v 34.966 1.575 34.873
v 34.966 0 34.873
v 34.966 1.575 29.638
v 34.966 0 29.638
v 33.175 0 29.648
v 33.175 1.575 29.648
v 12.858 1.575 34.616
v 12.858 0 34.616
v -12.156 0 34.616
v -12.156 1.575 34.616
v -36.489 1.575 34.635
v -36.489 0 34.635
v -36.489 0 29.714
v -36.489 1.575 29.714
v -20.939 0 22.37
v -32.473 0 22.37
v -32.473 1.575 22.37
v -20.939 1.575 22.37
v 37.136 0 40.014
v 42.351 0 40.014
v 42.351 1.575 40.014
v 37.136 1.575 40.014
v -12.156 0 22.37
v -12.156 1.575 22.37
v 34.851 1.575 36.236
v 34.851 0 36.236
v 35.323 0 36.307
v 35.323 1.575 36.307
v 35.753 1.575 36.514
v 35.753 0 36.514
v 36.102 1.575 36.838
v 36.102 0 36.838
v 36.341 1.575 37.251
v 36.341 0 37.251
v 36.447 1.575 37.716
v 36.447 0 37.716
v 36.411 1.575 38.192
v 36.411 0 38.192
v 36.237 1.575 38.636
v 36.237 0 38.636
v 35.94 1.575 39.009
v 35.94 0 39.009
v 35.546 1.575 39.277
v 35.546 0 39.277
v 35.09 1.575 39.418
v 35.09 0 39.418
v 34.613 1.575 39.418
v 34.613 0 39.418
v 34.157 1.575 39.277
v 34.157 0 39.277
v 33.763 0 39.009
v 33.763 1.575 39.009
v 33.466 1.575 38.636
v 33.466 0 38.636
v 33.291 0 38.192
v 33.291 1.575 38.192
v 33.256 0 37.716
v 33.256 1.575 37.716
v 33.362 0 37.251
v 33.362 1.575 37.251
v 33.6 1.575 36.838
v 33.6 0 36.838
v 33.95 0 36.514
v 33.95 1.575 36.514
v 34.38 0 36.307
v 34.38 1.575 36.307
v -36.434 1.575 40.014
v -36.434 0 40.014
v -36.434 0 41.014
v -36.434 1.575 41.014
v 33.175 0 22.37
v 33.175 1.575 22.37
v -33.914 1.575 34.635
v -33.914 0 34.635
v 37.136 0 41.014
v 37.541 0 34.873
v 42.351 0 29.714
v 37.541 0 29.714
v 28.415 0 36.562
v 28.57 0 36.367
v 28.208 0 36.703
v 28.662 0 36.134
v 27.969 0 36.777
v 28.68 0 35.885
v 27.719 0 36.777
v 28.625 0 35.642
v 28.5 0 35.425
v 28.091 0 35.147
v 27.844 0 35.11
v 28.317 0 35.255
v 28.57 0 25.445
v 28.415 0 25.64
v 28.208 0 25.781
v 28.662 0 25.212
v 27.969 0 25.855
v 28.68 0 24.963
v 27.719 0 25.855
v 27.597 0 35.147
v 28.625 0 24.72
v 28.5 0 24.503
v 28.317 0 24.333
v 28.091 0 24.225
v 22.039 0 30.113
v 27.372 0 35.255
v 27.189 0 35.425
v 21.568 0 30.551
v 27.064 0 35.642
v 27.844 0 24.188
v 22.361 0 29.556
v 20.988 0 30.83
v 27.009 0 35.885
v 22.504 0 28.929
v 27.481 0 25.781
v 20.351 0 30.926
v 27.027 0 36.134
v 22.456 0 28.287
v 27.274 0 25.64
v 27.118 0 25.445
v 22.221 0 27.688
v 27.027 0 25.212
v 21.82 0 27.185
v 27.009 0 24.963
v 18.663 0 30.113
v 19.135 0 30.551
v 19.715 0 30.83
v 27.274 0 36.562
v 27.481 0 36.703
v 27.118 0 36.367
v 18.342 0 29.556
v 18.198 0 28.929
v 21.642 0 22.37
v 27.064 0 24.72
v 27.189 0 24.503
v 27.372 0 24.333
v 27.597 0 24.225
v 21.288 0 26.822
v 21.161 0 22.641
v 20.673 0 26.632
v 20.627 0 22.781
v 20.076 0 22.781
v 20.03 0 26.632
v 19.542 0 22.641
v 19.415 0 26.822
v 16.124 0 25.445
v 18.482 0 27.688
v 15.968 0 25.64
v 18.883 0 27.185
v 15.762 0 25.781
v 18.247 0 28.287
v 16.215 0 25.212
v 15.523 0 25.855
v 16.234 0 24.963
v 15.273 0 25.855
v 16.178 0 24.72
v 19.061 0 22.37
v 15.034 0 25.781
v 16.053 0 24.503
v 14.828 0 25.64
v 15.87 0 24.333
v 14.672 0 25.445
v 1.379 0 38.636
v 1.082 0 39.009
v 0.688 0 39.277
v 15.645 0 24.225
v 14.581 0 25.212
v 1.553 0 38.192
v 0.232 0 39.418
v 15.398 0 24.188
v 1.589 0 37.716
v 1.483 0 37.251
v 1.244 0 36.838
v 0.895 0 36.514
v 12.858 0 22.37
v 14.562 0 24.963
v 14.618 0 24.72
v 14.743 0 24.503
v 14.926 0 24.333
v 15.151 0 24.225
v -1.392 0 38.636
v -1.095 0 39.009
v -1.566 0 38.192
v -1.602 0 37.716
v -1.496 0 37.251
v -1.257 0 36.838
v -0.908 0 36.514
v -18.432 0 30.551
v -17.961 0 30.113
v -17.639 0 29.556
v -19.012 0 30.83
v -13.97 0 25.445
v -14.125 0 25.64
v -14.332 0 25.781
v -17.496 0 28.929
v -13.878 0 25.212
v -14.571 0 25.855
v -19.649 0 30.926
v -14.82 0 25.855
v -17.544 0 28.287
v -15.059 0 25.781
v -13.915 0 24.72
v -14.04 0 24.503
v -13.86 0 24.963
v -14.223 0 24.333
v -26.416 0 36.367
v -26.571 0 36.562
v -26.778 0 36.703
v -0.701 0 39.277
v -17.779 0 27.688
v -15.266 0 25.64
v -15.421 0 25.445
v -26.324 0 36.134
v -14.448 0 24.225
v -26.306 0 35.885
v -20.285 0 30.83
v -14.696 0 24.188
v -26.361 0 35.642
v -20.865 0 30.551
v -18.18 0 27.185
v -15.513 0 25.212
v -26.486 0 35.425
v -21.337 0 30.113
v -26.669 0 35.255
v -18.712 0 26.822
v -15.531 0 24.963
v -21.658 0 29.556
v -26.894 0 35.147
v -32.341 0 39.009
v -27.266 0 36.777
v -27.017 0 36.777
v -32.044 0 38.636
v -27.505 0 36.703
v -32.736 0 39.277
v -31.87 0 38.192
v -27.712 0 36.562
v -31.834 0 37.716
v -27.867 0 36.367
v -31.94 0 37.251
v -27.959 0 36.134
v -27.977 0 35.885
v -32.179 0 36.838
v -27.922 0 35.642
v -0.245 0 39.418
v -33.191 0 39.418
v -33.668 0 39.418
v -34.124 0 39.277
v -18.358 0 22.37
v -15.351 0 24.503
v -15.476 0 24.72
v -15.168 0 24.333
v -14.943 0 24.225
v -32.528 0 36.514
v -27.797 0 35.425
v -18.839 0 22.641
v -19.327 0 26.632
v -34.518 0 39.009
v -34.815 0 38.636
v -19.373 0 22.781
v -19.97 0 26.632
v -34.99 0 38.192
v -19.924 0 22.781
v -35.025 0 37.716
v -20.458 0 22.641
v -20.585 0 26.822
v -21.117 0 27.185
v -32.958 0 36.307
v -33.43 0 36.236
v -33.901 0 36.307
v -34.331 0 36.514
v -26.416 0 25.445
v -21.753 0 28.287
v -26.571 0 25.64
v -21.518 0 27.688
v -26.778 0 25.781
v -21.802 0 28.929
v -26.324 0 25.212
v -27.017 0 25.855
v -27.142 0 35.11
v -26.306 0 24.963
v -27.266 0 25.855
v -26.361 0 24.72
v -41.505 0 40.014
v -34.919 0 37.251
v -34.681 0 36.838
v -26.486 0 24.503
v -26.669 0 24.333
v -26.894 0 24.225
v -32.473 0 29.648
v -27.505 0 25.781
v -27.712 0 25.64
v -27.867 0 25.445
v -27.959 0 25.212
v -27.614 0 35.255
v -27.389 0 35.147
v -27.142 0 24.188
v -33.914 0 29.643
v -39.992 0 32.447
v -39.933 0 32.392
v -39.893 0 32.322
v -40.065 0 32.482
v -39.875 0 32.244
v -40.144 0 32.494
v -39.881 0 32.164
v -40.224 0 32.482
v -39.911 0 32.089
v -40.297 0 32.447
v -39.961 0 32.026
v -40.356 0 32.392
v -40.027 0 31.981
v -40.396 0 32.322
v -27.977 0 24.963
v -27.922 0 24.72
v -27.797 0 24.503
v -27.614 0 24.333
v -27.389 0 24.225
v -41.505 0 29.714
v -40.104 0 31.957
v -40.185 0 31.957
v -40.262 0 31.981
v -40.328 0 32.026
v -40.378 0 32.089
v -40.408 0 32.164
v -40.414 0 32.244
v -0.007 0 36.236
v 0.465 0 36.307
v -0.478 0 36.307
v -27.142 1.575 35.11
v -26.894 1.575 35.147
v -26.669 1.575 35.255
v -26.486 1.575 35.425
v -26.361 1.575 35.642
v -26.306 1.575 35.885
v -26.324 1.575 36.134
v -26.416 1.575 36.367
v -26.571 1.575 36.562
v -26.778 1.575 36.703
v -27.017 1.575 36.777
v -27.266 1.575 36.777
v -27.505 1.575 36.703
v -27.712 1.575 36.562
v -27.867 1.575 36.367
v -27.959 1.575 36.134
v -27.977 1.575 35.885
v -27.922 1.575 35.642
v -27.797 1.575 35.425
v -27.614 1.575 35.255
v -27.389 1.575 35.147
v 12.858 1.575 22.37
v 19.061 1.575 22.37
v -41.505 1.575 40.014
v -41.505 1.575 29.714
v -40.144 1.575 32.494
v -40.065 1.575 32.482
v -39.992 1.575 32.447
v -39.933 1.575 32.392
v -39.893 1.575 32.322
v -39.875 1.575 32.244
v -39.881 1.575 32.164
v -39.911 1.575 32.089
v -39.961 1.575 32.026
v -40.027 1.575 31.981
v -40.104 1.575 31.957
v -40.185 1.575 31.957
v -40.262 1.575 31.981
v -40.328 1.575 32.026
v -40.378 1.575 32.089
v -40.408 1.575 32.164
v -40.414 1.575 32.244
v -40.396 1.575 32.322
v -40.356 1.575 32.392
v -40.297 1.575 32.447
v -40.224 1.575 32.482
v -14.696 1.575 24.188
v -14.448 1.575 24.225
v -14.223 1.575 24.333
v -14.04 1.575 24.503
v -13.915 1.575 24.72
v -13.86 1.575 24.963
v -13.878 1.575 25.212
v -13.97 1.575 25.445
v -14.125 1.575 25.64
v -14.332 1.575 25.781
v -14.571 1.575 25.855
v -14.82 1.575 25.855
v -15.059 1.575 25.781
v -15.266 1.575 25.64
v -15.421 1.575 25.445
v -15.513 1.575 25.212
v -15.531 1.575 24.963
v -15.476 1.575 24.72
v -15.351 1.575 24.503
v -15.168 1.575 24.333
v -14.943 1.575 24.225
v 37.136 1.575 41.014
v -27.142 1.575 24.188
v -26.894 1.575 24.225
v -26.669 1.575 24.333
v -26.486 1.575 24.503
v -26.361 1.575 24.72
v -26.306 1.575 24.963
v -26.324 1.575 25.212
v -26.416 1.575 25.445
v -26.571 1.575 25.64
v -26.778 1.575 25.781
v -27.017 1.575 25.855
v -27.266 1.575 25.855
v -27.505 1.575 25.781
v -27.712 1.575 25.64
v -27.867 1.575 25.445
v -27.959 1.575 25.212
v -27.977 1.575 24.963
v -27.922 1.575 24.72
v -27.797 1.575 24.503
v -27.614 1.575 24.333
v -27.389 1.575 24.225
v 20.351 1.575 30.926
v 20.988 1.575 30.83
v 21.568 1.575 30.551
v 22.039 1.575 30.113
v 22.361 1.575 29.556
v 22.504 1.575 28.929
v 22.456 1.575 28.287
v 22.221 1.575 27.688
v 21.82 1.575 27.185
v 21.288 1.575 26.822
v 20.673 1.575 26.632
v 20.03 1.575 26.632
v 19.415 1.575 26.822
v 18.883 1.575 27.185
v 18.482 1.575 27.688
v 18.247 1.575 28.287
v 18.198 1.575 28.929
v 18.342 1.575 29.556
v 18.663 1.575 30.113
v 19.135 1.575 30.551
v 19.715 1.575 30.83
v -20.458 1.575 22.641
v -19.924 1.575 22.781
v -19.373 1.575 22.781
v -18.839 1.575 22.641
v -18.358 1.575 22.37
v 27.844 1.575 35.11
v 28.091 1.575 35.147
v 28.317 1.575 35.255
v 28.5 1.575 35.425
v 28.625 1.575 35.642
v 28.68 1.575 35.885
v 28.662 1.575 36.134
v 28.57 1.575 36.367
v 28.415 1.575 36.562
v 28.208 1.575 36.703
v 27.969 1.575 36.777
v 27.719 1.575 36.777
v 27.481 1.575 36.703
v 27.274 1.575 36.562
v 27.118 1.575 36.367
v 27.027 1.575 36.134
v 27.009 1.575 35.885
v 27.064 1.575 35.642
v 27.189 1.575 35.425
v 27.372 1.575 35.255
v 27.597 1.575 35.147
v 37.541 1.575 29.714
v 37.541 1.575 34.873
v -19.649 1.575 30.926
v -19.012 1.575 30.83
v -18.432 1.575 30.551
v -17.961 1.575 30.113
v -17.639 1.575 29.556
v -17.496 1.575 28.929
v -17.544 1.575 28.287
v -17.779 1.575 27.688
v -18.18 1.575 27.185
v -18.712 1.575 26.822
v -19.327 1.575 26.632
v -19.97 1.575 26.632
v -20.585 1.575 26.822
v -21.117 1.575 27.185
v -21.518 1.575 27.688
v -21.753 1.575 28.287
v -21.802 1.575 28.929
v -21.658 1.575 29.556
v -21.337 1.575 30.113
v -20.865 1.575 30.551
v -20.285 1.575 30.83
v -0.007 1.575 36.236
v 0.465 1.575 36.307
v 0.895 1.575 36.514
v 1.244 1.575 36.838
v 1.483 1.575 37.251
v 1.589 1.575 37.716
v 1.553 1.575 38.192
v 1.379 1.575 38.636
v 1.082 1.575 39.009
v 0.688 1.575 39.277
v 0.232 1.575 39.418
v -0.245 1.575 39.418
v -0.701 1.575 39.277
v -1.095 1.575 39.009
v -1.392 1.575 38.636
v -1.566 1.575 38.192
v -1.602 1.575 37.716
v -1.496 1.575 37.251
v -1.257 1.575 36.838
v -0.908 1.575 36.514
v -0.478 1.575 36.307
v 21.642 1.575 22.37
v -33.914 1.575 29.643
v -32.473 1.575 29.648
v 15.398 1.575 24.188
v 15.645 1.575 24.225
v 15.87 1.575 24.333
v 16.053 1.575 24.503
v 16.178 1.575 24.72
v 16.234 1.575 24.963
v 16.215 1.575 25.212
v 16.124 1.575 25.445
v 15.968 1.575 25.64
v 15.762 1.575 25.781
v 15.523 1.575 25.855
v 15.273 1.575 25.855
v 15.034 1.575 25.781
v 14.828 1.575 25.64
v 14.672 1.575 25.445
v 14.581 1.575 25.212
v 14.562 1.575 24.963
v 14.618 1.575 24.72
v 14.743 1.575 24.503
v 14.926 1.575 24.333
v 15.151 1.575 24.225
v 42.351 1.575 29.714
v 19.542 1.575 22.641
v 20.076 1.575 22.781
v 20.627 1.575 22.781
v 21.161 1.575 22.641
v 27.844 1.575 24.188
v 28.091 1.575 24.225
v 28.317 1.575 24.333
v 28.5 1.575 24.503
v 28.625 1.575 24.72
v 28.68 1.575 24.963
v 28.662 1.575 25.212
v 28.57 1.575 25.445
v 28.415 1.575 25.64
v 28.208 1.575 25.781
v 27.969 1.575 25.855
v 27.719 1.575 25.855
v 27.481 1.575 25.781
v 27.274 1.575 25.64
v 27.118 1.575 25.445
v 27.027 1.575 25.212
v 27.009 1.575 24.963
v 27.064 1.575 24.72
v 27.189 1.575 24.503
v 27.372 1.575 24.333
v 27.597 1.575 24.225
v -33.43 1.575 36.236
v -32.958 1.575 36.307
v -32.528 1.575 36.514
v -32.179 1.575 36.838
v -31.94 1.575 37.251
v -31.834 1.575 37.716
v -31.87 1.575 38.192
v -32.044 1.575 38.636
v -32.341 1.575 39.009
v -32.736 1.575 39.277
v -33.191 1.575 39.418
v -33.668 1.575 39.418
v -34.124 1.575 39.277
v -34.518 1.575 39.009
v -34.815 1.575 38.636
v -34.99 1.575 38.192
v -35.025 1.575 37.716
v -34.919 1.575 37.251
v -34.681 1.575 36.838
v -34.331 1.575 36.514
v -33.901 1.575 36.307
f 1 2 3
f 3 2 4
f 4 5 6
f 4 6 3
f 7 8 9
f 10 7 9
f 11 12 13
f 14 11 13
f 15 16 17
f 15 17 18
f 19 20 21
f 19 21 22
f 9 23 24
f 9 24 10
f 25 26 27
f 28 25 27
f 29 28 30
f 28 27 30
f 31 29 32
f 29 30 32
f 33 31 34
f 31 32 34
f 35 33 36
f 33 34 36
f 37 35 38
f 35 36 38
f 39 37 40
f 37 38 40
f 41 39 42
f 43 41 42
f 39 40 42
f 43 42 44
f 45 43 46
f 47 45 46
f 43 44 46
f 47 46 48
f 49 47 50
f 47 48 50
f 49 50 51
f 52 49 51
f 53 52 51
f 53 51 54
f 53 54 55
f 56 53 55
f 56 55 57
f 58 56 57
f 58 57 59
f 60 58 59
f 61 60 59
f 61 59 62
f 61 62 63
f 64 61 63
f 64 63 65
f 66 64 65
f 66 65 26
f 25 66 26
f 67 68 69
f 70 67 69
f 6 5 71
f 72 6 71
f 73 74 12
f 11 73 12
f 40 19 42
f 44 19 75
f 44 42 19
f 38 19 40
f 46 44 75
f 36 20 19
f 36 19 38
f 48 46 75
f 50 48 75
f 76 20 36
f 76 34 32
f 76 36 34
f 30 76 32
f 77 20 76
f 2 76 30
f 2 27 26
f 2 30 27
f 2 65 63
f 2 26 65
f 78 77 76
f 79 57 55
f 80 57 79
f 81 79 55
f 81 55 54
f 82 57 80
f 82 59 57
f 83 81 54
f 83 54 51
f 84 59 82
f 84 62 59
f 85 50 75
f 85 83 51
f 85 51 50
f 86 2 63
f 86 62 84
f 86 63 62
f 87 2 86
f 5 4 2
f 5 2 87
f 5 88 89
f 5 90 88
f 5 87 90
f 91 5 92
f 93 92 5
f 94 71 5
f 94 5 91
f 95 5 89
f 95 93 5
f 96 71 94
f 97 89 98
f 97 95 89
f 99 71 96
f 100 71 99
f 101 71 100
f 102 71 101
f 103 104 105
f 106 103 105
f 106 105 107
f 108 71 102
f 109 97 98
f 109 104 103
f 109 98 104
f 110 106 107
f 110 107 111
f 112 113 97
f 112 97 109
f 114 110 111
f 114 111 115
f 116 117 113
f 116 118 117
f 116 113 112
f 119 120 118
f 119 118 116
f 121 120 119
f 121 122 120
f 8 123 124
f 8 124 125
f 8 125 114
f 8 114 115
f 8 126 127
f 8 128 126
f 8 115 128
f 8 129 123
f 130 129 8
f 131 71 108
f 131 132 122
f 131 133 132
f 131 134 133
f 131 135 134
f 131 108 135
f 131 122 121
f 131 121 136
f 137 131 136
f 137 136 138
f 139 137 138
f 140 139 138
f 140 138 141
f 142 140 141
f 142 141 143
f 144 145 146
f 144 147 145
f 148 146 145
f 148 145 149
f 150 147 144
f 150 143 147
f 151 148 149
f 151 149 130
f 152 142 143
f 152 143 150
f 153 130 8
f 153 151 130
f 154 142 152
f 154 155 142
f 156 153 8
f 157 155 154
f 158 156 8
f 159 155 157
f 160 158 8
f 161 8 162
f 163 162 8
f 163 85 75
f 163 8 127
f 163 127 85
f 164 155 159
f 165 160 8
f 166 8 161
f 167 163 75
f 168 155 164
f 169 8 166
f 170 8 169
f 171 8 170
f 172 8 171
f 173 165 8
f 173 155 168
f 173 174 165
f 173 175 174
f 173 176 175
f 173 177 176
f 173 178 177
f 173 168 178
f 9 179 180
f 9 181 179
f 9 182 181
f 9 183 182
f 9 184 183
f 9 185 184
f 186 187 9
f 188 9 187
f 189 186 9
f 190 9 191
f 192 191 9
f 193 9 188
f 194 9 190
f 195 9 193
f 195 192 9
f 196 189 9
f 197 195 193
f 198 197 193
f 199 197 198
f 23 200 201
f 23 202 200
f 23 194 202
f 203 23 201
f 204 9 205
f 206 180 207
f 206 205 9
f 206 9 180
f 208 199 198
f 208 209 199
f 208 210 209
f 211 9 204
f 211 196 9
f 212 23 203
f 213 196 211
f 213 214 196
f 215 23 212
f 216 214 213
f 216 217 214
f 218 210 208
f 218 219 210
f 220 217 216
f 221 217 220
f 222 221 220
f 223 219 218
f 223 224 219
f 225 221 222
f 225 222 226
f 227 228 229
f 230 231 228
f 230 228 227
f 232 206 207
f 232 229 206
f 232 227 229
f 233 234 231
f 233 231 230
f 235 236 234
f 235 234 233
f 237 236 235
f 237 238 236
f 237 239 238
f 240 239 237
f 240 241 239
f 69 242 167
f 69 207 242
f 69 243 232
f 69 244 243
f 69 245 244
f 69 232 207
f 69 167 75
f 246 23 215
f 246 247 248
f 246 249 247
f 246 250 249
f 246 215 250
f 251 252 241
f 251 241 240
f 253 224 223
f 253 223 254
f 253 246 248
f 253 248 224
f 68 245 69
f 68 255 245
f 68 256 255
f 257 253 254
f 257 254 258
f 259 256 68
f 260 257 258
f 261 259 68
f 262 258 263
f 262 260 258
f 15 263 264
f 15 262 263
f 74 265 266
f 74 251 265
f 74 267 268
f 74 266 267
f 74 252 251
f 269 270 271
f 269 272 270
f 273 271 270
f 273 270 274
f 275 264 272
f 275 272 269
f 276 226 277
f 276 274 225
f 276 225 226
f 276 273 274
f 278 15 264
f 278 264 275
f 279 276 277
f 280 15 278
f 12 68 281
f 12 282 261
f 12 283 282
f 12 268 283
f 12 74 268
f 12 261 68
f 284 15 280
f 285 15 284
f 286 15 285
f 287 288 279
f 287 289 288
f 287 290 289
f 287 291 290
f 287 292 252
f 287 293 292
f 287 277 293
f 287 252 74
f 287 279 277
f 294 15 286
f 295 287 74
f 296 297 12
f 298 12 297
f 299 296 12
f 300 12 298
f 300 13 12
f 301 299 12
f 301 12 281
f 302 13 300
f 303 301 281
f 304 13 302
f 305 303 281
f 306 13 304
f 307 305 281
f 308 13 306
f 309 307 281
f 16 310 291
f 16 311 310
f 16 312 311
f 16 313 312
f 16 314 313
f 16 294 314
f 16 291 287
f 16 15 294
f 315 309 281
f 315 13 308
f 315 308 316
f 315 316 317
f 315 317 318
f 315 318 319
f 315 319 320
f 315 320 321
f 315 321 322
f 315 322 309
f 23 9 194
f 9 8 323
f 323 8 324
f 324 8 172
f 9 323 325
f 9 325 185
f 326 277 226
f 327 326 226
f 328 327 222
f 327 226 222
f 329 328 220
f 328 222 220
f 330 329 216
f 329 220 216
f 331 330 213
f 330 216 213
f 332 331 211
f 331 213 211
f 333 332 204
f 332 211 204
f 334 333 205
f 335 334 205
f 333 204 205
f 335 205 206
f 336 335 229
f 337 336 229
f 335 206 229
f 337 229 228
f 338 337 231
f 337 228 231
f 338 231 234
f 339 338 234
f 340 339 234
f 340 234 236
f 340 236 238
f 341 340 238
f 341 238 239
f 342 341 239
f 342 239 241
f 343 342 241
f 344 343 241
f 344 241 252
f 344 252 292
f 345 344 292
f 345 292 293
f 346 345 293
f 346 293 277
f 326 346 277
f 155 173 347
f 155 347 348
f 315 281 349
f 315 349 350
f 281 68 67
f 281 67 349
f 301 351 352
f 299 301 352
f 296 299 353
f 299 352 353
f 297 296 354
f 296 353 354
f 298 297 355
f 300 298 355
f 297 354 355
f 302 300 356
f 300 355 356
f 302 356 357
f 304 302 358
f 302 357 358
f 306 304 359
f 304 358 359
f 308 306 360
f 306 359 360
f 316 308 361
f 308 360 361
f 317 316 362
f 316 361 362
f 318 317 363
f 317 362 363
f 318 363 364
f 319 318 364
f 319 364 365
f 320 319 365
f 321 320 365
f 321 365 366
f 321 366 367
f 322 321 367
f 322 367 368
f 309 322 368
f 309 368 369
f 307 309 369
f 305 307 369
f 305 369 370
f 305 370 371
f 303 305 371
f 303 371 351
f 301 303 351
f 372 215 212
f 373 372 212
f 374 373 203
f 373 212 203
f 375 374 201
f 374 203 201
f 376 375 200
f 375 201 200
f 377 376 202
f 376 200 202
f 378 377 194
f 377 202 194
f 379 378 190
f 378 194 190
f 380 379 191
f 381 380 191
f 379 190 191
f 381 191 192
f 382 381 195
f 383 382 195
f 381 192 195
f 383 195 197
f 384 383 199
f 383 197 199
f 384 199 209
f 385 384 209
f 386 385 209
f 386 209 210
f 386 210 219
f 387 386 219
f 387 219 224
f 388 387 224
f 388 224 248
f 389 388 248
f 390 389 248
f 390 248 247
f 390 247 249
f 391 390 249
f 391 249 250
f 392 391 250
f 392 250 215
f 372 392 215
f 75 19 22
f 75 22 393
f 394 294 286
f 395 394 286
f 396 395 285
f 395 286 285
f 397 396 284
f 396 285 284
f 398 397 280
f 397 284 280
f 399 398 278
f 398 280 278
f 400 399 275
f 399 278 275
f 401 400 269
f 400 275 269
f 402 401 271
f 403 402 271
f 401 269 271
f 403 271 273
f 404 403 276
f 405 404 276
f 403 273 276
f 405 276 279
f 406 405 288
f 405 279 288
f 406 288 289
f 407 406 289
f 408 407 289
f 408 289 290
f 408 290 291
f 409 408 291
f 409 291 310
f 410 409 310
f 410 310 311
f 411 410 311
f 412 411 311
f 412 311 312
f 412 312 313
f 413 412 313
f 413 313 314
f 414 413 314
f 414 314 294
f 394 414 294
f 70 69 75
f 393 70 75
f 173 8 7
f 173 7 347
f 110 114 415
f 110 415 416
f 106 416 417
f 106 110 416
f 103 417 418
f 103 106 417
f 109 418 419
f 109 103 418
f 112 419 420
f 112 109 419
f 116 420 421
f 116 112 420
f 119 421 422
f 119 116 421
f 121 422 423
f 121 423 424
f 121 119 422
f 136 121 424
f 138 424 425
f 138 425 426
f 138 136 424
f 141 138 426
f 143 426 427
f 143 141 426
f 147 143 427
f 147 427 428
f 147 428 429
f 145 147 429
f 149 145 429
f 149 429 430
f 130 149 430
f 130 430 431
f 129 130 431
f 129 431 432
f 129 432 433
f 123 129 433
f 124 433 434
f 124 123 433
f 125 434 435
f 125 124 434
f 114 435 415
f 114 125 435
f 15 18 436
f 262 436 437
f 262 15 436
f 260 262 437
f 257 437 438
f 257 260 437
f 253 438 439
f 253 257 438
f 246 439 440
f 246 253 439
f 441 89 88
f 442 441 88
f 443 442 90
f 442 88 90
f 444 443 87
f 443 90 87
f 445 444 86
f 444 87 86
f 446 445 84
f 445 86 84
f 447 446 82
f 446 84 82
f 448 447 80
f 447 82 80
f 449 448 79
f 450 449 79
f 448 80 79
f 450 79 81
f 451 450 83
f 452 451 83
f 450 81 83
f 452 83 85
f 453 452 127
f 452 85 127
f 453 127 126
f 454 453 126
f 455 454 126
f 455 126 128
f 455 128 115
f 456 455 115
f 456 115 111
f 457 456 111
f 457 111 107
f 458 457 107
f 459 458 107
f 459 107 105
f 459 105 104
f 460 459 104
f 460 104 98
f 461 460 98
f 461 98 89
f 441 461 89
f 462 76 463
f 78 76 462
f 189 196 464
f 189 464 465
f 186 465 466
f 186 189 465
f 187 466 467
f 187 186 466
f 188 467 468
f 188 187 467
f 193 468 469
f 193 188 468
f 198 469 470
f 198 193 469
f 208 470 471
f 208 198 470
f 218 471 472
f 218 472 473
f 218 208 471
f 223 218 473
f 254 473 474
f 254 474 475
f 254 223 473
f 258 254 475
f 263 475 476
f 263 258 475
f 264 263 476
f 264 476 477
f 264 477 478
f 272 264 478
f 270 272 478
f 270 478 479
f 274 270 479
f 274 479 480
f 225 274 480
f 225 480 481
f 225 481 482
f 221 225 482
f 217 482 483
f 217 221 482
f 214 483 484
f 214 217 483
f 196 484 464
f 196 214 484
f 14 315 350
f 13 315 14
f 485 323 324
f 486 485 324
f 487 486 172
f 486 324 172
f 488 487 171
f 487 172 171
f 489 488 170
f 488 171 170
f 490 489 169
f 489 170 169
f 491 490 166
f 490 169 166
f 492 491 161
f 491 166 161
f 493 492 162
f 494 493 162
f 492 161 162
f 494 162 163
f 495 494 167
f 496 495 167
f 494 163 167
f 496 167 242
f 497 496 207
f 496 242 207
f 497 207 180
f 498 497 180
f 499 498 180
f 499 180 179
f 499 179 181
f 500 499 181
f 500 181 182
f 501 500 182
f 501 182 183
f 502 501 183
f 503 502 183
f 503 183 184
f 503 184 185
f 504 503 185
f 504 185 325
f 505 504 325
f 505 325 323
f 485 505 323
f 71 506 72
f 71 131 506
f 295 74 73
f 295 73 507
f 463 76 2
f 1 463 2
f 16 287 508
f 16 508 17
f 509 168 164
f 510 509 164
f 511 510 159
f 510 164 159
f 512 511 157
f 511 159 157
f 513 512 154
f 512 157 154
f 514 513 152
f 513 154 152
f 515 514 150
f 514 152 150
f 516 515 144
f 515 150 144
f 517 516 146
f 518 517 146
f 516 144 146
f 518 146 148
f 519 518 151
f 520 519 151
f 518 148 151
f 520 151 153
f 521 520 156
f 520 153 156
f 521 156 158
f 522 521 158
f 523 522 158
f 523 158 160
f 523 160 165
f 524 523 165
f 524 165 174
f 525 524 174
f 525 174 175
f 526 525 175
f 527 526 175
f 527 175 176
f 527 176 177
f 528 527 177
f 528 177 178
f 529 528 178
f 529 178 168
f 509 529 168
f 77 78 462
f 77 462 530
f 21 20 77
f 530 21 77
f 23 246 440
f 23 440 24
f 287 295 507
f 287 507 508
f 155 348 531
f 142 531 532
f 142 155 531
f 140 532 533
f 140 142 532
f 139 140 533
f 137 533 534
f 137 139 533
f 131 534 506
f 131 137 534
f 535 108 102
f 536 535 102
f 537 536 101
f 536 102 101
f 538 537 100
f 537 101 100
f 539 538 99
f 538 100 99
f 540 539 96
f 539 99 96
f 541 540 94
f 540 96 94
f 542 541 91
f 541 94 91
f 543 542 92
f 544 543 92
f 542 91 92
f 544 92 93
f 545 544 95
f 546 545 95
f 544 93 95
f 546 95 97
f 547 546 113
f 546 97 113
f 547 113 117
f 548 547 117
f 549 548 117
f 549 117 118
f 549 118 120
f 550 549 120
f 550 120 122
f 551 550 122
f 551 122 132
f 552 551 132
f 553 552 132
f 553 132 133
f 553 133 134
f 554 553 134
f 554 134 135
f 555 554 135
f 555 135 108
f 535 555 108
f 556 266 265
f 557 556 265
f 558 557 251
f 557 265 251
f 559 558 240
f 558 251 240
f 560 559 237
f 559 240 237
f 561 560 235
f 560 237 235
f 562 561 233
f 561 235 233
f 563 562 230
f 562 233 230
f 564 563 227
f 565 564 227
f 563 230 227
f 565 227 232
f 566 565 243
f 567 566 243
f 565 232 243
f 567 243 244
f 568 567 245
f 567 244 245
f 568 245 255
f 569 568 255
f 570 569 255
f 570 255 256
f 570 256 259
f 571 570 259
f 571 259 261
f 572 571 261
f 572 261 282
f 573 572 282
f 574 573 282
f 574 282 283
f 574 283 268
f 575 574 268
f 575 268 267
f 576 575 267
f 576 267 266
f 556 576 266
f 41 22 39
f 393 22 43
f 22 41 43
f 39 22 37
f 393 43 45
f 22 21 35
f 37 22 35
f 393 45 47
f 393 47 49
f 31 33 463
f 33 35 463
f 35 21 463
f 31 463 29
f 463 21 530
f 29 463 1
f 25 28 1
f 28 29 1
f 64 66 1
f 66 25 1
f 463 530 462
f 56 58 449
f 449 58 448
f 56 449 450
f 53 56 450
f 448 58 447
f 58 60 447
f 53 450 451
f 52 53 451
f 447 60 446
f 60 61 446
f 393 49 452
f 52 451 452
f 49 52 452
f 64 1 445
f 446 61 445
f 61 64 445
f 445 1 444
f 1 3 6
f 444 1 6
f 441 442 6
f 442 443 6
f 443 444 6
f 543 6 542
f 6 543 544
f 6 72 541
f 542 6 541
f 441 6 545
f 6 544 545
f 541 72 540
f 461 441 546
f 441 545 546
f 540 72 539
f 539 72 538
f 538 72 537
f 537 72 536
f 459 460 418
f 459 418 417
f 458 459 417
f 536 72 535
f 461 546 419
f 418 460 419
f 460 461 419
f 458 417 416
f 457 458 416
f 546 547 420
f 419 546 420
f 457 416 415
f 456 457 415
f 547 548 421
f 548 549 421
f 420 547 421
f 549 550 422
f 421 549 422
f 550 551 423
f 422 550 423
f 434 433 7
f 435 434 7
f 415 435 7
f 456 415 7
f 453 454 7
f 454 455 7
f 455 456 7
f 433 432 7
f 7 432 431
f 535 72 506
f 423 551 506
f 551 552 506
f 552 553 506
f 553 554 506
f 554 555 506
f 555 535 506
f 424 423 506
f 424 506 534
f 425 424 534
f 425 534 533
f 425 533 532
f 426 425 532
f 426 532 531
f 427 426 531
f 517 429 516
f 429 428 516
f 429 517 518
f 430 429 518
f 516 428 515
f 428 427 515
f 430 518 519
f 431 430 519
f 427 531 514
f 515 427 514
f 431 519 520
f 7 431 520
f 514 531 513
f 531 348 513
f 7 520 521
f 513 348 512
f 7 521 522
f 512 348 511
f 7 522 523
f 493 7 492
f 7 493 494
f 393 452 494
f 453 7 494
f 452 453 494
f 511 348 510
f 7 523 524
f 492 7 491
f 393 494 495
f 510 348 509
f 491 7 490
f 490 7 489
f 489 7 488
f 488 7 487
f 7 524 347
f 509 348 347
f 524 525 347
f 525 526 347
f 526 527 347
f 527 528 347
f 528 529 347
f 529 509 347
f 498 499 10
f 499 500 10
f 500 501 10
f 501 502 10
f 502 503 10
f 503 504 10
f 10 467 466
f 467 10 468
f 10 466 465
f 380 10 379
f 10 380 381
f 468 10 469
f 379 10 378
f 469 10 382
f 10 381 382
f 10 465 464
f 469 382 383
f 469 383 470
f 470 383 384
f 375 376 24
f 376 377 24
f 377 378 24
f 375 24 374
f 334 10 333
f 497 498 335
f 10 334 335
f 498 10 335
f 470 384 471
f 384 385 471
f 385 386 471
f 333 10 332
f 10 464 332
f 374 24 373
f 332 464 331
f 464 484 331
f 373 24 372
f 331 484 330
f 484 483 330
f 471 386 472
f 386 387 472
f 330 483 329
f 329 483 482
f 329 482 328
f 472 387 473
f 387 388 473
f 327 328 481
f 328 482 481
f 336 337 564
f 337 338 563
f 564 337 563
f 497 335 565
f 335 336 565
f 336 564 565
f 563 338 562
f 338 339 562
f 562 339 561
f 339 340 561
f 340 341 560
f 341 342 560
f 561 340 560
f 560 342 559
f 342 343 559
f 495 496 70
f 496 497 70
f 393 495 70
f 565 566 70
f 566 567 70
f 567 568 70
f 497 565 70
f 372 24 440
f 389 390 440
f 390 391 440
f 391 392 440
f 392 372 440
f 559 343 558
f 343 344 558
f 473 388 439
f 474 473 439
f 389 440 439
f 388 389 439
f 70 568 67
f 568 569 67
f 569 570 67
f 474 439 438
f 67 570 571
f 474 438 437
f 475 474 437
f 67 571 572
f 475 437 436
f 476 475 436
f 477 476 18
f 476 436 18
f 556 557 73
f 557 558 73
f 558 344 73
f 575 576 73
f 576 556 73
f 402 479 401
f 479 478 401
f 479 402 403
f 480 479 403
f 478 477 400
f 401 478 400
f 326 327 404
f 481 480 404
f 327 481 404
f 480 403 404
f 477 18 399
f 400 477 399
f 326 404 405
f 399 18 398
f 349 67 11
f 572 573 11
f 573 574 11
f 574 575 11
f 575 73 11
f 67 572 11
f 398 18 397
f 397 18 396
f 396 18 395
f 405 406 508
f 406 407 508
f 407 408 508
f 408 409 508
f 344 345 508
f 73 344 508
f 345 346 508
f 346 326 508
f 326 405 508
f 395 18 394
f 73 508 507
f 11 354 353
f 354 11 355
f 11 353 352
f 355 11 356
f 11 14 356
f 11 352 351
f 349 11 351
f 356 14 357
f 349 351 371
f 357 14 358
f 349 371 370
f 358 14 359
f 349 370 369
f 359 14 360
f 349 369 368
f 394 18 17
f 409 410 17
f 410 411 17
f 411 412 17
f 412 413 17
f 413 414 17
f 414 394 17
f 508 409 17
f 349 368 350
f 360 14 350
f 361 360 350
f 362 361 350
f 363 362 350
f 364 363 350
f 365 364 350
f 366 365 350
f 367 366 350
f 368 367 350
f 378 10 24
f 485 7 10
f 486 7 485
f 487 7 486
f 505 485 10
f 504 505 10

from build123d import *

# Parameters (mm, degrees)
SKETCH1_R                           = 2.159
BOSS_EXTRUDE1_DEPTH                 = 1.575
SKETCH2_W                           = 93.457658642
SKETCH2_H                           = 6.602
CUT_EXTRUDE1_DEPTH                  = 65.362755899
CUT_EXTRUDE2_DEPTH                  = 60.755092082
CUT_EXTRUDE3_DEPTH                  = 60.755092082
SKETCH6_R                           = 0.8382
CUT_EXTRUDE4_DEPTH                  = 2.54
SKETCH7_W                           = 65.648
SKETCH7_H                           = 12
CUT_EXTRUDE5_DEPTH                  = 59.286069146
SKETCH11_R                          = 0.270027719
ID_HOLE_DEPTH                       = 59.286069146
SKETCH12_W                          = 2.575
SKETCH12_H                          = 5
NOTCH_FOR_BPR_TOP_VIEW_DEPTH        = 59.286069146
SKETCH14_W                          = 2.575
SKETCH14_H                          = 12.502619879
NOTCH_FOR_BPL_TOP_VIEW_DEPTH        = 59.286069146
SKETCH17_W                          = 73.57
SKETCH17_H                          = 1
CREATE_LIP_FOR_M3_SPACER_HOLE_DEPTH = 1.575
SKETCH15_R                          = 1.6
HOLE_FOR_M3_SPACER_DEPTH            = 59.977069112
SKETCH19_W                          = 6.013982762
SKETCH19_H                          = 1.7
SKETCH19_W_2                        = 9.814467677
CUT_EXTRUDE7_DEPTH                  = 59.977069112


with BuildPart() as part:
    # Sketch1 → Boss-Extrude1 (new body)
    with BuildSketch(Plane(origin=(0, 0, 0), x_dir=(1, 0, 0), z_dir=(0, 1, 0))):
        Polygon((44.351293299, -40.014412246), (37.136293299, -40.014412246), (37.136293299, -46.615946892), (29.968293307, -46.615946892), (-30.083706693, -46.615946892), (-36.433706701, -46.615946892), (-36.433706701, -40.014412246), (-43.648706701, -40.014412246), (-43.648706701, -30.885946892), (-43.648706701, -29.647946892), (-42.378706693, -29.615946892), (-32.472706701, -29.647946892), (-32.472706701, -10.370428445), (-12.155556701, -10.370428445), (-12.155556701, -34.615947016), (-11.557706701, -34.615947016), (12.260293299, -34.615947016), (12.858143299, -34.615947016), (12.858143299, -10.370428445), (33.175293299, -10.370428445), (33.175293299, -12.929386892), (33.175293299, -29.647946892), (38.746293307, -29.615946892), (42.351293307, -29.615946892), (44.351293299, -29.615946892), (44.351293299, -31.651946892), align=None)
        with Locations(Location((-19.648556701, -28.76738335, 0), (0, 0, 270))):
            Circle(SKETCH1_R, mode=Mode.SUBTRACT)
        with Locations(Location((-19.648556701, -20.63938335, 0), (0, 0, 270))):
            Circle(SKETCH1_R, mode=Mode.SUBTRACT)
        with Locations(Location((20.351397299, -20.63938335, 0), (0, 0, 270))):
            Circle(SKETCH1_R, mode=Mode.SUBTRACT)
        with Locations(Location((20.351397299, -28.76738335, 0), (0, 0, 270))):
            Circle(SKETCH1_R, mode=Mode.SUBTRACT)
    extrude(amount=BOSS_EXTRUDE1_DEPTH)

    # Sketch2 → Cut-Extrude1 (cut, through all)
    with BuildSketch(Plane.XZ):
        with Locations((-2.377536022, 43.315412246)):
            Rectangle(SKETCH2_W, SKETCH2_H)
    extrude(amount=-CUT_EXTRUDE1_DEPTH, mode=Mode.SUBTRACT)

    # Sketch3 → Cut-Extrude2 (cut, through all)
    with BuildSketch(Plane.XZ):
        Polygon((-41.504650493, 40.014412246), (-41.504650493, 29.618770413), (-34.629650483, 29.640979175), (-34.629650483, 8.976090323), (-48.128778183, 8.976090323), (-48.128778183, 40.014412246), align=None)
    extrude(amount=-CUT_EXTRUDE2_DEPTH, mode=Mode.SUBTRACT)

    # Sketch4 → Cut-Extrude3 (cut, through all)
    with BuildSketch(Plane.XZ):
        Polygon((42.351293299, 40.014412246), (42.351293299, 32.420104455), (42.351293299, 29.615946892), (35.476293307, 29.615946892), (35.476293307, 10.370428445), (54.710892309, 10.370428445), (54.710892309, 40.014412246), align=None)
    extrude(amount=-CUT_EXTRUDE3_DEPTH, mode=Mode.SUBTRACT)

    # Sketch6 → Cut-Extrude4 (cut)
    with BuildSketch(Plane(origin=(0, 0, 0), x_dir=(-1, 0, 0), z_dir=(0, -1, 0))):
        with Locations(Location((27.141556701, -35.947946892, 0), (0, 0, 90))):
            Circle(SKETCH6_R)
        with Locations(Location((27.141556701, -25.025946892, 0), (0, 0, 90))):
            Circle(SKETCH6_R)
        with Locations(Location((14.695556701, -25.025946892, 0), (0, 0, 90))):
            Circle(SKETCH6_R)
        with Locations(Location((-15.398143299, -25.025946892, 0), (0, 0, 90))):
            Circle(SKETCH6_R)
        with Locations(Location((-27.844397299, -25.025946892, 0), (0, 0, 90))):
            Circle(SKETCH6_R)
        with Locations(Location((-27.844397299, -35.947946892, 0), (0, 0, 90))):
            Circle(SKETCH6_R)
    extrude(amount=-CUT_EXTRUDE4_DEPTH, mode=Mode.SUBTRACT)

    # Sketch7 → Cut-Extrude5 (cut, through all)
    with BuildSketch(Plane.XZ):
        with Locations((0.351293299, 16.370428445)):
            Rectangle(SKETCH7_W, SKETCH7_H)
    extrude(amount=-CUT_EXTRUDE5_DEPTH, mode=Mode.SUBTRACT)

    # Sketch11 → ID HOLE (cut, through all)
    with BuildSketch(Plane(origin=(0, 1.575, 0), x_dir=(1, 0, 0), z_dir=(0, 1, 0))):
        with Locations(Location((-40.144429695, -32.22382703, 0), (0, 0, 270))):
            Circle(SKETCH11_R)
    extrude(amount=-ID_HOLE_DEPTH, mode=Mode.SUBTRACT)

    # Sketch12 → Notch for BPR (TOP VIEW) (cut, through all)
    with BuildSketch(Plane(origin=(0, 0, 0), x_dir=(-1, 0, 0), z_dir=(0, -1, 0))):
        with Locations((35.201150493, -32.134973926)):
            Rectangle(SKETCH12_W, SKETCH12_H)
    extrude(amount=-NOTCH_FOR_BPR_TOP_VIEW_DEPTH, mode=Mode.SUBTRACT)

    # Sketch14 → Notch for BPL (TOP VIEW) (cut, through all)
    with BuildSketch(Plane(origin=(0, 0, 0), x_dir=(-1, 0, 0), z_dir=(0, -1, 0))):
        with Locations((-36.253849507, -28.621738385)):
            Rectangle(SKETCH14_W, SKETCH14_H)
    extrude(amount=-NOTCH_FOR_BPL_TOP_VIEW_DEPTH, mode=Mode.SUBTRACT)

    # Sketch17 → Create Lip for M3 Spacer Hole (add)
    with BuildSketch(Plane.XZ):
        with Locations((0.351293299, 40.514412246)):
            Rectangle(SKETCH17_W, SKETCH17_H)
    extrude(amount=-CREATE_LIP_FOR_M3_SPACER_HOLE_DEPTH)

    # Sketch15 → HOLE for M3 Spacer (cut, through all)
    with BuildSketch(Plane.XZ):
        with Locations(Location((-0.006565304, 37.835831124, 0), (0, 0, 270))):
            Circle(SKETCH15_R)
        with Locations(Location((-33.429715371, 37.835831124, 0), (0, 0, 270))):
            Circle(SKETCH15_R)
        with Locations(Location((34.851293299, 37.835831124, 0), (0, 0, 270))):
            Circle(SKETCH15_R)
    extrude(amount=-HOLE_FOR_M3_SPACER_DEPTH, mode=Mode.SUBTRACT)

    # Sketch19 → Cut-Extrude7 (cut, through all)
    with BuildSketch(Plane.XZ):
        with Locations((40.047258401, 28.864412246)):
            Rectangle(SKETCH19_W, SKETCH19_H)
        with Locations((-40.560325306, 28.864412246)):
            Rectangle(SKETCH19_W_2, SKETCH19_H)
    extrude(amount=-CUT_EXTRUDE7_DEPTH, mode=Mode.SUBTRACT)


solid = part.part
